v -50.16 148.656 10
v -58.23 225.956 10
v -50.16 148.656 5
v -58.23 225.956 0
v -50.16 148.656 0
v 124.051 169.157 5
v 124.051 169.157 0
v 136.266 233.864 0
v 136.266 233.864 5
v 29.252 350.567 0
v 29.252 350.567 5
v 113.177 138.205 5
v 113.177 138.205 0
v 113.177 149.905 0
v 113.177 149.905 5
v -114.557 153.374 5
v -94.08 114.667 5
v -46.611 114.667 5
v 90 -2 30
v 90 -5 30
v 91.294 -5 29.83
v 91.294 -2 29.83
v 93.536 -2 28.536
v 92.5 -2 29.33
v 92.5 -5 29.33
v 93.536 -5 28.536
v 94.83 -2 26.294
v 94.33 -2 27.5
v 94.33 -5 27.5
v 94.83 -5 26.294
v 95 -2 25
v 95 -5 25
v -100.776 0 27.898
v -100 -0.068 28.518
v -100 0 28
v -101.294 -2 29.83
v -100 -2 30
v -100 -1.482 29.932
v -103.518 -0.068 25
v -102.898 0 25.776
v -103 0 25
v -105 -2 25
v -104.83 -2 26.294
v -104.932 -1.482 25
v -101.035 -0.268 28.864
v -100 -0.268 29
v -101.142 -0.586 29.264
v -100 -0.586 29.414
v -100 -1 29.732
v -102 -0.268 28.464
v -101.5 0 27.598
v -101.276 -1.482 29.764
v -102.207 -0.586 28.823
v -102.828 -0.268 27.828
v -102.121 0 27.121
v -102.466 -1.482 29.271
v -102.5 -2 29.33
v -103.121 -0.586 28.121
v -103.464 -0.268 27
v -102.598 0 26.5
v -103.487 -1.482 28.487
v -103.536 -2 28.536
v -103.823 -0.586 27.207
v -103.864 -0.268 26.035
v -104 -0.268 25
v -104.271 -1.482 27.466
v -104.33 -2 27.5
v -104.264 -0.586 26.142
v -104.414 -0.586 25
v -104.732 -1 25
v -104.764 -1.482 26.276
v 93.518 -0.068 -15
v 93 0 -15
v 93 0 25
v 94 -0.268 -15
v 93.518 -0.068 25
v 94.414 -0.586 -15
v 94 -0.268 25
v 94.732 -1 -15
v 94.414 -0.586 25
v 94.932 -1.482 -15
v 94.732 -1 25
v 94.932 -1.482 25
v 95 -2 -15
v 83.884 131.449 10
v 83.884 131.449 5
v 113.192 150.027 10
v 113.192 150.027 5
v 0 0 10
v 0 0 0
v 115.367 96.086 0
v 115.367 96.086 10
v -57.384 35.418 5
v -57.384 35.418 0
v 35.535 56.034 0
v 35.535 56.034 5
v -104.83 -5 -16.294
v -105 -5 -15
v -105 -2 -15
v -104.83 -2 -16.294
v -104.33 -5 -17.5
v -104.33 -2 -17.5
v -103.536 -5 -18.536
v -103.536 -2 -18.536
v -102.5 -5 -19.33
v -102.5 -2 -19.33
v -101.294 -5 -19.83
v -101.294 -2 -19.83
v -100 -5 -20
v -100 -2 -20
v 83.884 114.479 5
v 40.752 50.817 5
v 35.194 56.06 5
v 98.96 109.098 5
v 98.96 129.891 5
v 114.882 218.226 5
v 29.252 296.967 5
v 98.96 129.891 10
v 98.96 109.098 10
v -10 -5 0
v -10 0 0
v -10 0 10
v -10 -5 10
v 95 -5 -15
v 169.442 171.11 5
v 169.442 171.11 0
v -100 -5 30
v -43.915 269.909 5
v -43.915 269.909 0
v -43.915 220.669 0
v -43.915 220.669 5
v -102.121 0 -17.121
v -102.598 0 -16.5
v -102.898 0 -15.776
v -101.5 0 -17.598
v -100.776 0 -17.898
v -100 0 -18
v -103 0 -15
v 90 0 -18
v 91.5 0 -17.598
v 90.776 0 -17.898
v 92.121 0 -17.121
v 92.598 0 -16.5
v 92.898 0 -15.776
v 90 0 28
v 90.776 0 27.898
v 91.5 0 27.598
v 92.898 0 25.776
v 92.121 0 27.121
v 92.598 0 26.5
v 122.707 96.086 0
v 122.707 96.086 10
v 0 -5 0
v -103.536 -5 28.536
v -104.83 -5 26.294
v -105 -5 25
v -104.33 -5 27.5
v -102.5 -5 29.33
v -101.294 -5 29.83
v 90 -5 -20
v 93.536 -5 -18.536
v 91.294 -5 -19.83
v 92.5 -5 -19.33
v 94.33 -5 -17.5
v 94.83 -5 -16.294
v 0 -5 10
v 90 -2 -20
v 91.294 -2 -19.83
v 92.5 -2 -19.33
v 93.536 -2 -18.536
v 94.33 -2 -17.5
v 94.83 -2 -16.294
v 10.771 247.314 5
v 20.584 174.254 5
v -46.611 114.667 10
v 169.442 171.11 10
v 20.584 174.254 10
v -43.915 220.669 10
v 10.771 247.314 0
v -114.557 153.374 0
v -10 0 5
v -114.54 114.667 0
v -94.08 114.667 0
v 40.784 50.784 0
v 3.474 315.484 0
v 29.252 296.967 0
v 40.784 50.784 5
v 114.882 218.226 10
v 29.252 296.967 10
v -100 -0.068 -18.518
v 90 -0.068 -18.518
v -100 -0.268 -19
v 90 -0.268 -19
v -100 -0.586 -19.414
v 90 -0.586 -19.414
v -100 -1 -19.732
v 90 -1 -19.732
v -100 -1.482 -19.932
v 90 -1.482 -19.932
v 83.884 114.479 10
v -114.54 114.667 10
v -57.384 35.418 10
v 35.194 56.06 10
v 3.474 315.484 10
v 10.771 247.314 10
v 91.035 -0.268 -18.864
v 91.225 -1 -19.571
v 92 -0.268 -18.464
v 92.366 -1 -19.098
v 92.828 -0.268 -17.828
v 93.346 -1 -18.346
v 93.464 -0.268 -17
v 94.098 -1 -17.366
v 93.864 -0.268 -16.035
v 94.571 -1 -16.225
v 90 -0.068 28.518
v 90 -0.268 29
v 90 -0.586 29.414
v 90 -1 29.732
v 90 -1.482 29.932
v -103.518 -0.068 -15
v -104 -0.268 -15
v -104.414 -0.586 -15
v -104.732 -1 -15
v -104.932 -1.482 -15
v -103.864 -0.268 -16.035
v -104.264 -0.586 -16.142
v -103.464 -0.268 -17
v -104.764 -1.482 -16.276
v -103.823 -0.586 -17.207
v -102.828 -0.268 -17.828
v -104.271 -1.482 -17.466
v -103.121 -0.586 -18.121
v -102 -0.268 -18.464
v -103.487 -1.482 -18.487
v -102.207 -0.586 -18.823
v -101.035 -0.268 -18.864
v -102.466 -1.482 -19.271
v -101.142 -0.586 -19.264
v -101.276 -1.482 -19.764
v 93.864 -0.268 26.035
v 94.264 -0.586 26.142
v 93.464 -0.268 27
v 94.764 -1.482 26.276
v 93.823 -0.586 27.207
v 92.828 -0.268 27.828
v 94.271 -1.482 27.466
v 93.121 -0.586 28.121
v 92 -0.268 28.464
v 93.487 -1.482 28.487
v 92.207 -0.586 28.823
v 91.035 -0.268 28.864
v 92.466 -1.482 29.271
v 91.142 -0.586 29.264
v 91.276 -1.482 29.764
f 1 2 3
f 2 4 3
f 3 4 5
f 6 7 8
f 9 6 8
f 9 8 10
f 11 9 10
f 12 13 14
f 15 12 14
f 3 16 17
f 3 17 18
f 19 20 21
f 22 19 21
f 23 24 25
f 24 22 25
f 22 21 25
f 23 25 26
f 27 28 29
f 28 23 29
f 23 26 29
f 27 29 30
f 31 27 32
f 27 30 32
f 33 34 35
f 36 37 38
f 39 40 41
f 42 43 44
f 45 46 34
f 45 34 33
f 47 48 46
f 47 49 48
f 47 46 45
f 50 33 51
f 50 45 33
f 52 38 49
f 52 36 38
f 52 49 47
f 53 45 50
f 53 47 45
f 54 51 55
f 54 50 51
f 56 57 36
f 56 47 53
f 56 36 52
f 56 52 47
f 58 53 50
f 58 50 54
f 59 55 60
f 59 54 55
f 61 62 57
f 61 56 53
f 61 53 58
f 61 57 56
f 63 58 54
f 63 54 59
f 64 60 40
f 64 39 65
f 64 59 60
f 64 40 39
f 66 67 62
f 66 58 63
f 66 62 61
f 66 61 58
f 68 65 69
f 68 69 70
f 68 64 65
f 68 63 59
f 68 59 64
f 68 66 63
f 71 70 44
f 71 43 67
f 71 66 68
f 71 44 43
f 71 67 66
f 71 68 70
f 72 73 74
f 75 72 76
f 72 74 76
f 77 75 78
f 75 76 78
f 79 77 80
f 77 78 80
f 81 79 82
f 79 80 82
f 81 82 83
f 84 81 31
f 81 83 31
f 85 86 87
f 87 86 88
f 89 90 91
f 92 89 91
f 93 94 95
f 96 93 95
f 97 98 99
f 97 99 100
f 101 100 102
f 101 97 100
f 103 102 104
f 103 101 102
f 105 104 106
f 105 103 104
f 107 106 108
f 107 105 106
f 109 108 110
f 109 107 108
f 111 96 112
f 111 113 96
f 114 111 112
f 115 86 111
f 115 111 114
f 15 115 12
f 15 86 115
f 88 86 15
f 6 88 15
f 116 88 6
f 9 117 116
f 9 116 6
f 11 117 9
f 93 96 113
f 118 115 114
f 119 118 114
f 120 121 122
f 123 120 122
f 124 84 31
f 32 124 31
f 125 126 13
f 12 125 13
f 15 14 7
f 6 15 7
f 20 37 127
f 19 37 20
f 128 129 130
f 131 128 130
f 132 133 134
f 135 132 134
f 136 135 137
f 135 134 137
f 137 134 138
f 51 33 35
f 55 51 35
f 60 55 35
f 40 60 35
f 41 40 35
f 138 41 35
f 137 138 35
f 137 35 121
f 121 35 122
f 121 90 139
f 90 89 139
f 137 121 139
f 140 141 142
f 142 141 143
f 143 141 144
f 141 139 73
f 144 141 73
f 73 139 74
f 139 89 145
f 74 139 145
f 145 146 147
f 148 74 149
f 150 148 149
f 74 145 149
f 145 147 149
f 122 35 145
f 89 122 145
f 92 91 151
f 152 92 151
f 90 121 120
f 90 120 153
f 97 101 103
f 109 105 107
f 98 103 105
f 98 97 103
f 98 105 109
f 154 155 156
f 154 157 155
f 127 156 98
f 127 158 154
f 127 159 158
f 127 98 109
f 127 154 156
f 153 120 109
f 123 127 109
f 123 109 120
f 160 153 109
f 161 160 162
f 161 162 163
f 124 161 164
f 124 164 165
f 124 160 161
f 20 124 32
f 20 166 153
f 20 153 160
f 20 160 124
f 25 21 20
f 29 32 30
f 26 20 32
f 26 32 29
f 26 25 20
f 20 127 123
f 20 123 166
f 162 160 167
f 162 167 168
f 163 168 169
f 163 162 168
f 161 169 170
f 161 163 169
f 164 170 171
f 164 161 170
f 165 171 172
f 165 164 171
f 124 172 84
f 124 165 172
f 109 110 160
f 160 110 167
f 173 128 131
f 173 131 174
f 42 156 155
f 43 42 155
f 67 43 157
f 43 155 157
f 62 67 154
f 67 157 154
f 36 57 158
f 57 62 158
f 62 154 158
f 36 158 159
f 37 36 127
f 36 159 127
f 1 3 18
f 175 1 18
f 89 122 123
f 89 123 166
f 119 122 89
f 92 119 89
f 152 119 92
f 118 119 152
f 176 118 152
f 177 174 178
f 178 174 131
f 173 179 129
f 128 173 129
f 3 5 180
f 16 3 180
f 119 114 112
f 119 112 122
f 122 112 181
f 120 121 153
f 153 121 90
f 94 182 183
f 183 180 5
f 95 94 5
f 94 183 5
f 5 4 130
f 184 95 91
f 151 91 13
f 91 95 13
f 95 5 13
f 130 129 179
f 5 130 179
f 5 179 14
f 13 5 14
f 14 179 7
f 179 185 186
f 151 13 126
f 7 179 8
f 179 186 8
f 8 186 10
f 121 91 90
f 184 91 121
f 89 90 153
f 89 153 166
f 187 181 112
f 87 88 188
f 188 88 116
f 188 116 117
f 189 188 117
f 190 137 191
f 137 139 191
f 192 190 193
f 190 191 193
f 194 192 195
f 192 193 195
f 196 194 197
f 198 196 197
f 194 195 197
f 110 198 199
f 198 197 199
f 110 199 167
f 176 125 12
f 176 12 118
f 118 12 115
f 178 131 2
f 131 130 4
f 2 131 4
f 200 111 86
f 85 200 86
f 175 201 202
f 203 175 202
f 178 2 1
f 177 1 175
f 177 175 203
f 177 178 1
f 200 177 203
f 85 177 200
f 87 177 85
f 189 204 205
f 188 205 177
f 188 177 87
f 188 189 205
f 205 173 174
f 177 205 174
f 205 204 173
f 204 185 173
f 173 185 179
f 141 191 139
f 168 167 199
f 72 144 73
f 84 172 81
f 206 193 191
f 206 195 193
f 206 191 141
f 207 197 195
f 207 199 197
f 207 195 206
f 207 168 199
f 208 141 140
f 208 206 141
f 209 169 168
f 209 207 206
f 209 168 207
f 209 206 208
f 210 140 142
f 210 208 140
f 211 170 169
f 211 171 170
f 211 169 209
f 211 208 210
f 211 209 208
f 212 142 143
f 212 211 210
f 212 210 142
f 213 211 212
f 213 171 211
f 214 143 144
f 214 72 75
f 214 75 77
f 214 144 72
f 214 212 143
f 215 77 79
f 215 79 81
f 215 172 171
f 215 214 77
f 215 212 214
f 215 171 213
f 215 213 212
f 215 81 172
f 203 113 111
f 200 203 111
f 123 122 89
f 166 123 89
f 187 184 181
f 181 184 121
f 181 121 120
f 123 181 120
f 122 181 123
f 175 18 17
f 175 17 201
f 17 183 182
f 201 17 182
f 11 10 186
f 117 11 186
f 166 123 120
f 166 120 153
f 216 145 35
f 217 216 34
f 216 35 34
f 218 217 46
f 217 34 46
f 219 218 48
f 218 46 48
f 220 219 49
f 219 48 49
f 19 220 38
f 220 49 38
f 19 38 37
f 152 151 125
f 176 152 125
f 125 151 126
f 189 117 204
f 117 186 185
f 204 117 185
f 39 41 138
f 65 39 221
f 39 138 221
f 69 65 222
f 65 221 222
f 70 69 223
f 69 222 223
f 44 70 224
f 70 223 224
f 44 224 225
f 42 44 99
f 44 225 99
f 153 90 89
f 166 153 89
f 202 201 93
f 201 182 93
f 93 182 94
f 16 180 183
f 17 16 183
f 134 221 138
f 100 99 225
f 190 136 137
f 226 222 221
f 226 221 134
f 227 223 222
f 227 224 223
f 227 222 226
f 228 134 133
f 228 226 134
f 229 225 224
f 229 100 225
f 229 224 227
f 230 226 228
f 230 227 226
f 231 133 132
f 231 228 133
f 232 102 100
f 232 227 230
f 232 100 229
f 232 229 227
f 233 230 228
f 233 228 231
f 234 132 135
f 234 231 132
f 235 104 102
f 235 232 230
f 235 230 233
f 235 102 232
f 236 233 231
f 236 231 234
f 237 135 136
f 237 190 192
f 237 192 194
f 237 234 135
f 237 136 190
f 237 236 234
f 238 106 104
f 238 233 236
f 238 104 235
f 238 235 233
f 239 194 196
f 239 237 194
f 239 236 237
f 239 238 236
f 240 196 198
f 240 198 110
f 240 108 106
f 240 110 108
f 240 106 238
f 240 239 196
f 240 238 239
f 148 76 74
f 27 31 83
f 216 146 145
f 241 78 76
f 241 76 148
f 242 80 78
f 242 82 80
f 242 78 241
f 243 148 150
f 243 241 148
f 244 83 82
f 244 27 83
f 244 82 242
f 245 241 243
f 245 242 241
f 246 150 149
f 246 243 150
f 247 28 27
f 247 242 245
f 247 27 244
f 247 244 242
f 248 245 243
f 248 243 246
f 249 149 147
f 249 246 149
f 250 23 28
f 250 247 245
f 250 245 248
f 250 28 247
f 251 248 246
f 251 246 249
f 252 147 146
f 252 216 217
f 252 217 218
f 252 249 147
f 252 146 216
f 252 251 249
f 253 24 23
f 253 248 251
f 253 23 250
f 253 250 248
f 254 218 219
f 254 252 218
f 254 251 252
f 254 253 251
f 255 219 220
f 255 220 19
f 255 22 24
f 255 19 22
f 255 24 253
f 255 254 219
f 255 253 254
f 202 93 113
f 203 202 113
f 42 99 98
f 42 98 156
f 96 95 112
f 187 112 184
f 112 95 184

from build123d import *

# Parameters (mm, degrees)
PAD_DEPTH     = 5
PAD001_DEPTH  = 5
SKETCH002_W   = 10
SKETCH002_H   = 10
PAD002_DEPTH  = 5
SKETCH003_W   = 200
SKETCH003_H   = 50
SKETCH003_W_2 = 10
SKETCH003_H_2 = 10
PAD003_DEPTH  = 5
FILLET_R      = 5
FILLET001_R   = 2


with BuildPart() as monarchbody:
    # Sketch → Pad (new body)
    with BuildSketch(Plane.XY):
        Polygon((0, 0), (115.36686, 96.085936), (122.70686, 96.085936), (169.441716, 171.110235), (113.177076, 138.205482), (113.177076, 149.905482), (124.051124, 169.156643), (136.265977, 233.863829), (29.25228, 350.566974), (29.25228, 296.966974), (3.473517, 315.484073), (10.77088, 247.313537), (-43.914811, 269.909202), (-43.914811, 220.669202), (-58.229767, 225.955945), (-50.159778, 148.656051), (-114.557198, 153.373802), (-94.080062, 114.666554), (-114.540062, 114.666554), (-57.383847, 35.417509), (35.53474, 56.034079), (40.784409, 50.784409), (-10, 0), align=None)
    extrude(amount=PAD_DEPTH)

    # Sketch001 (on Face25 of Pad) → Pad001 (join)
    with BuildSketch(Plane.XY.offset(5)):
        Polygon((29.25228, 296.966974), (3.473517, 315.484073), (10.77088, 247.313537), (20.584034, 174.253766), (-43.914811, 220.669202), (-58.229767, 225.955945), (-50.159778, 148.656051), (-46.611328, 114.666554), (-94.080062, 114.666554), (-114.540062, 114.666554), (-57.383847, 35.417509), (35.193908, 56.060199), (83.883975, 114.479096), (83.883975, 131.449096), (113.191885, 150.026943), (114.882454, 218.225993), align=None)
        Polygon((-10, 0), (0, 0), (115.36686, 96.085936), (122.70686, 96.085936), (169.441716, 171.110235), (98.959853, 129.890949), (98.959853, 109.097693), align=None)
    extrude(amount=PAD001_DEPTH)

    # Sketch002 (on Face2 of Pad001) → Pad002 (join)
    with BuildSketch(Plane.XZ):
        with Locations((-5, 5)):
            Rectangle(SKETCH002_W, SKETCH002_H)
    extrude(amount=PAD002_DEPTH)


with BuildPart() as standbody:
    # Sketch003 → Pad003 (new body)
    with BuildSketch(Plane.XZ):
        with Locations((-5, 5)):
            Rectangle(SKETCH003_W, SKETCH003_H)
        with Locations((-5, 5)):
            Rectangle(SKETCH003_W_2, SKETCH003_H_2, mode=Mode.SUBTRACT)
    extrude(amount=PAD003_DEPTH)

    # Fillet
    fillet_edges = [standbody.edges().sort_by_distance(p)[0] for p in [
        (95, -2.5, 30),
        (-105, -2.5, 30),
        (-105, -2.5, -20),
        (95, -2.5, -20),
    ]]
    fillet(fillet_edges, radius=FILLET_R)

    # Fillet001
    fillet001_edges = [standbody.edges().sort_by_distance(p)[0] for p in [
        (93.535534, 0, -18.535534),
        (-5, 0, -20),
        (-103.535534, 0, -18.535534),
        (-105, 0, 5),
        (-103.535534, 0, 28.535534),
        (-5, 0, 30),
        (93.535534, 0, 28.535534),
        (95, 0, 5),
    ]]
    fillet(fillet001_edges, radius=FILLET001_R)


solid = Compound([monarchbody.part, standbody.part])
